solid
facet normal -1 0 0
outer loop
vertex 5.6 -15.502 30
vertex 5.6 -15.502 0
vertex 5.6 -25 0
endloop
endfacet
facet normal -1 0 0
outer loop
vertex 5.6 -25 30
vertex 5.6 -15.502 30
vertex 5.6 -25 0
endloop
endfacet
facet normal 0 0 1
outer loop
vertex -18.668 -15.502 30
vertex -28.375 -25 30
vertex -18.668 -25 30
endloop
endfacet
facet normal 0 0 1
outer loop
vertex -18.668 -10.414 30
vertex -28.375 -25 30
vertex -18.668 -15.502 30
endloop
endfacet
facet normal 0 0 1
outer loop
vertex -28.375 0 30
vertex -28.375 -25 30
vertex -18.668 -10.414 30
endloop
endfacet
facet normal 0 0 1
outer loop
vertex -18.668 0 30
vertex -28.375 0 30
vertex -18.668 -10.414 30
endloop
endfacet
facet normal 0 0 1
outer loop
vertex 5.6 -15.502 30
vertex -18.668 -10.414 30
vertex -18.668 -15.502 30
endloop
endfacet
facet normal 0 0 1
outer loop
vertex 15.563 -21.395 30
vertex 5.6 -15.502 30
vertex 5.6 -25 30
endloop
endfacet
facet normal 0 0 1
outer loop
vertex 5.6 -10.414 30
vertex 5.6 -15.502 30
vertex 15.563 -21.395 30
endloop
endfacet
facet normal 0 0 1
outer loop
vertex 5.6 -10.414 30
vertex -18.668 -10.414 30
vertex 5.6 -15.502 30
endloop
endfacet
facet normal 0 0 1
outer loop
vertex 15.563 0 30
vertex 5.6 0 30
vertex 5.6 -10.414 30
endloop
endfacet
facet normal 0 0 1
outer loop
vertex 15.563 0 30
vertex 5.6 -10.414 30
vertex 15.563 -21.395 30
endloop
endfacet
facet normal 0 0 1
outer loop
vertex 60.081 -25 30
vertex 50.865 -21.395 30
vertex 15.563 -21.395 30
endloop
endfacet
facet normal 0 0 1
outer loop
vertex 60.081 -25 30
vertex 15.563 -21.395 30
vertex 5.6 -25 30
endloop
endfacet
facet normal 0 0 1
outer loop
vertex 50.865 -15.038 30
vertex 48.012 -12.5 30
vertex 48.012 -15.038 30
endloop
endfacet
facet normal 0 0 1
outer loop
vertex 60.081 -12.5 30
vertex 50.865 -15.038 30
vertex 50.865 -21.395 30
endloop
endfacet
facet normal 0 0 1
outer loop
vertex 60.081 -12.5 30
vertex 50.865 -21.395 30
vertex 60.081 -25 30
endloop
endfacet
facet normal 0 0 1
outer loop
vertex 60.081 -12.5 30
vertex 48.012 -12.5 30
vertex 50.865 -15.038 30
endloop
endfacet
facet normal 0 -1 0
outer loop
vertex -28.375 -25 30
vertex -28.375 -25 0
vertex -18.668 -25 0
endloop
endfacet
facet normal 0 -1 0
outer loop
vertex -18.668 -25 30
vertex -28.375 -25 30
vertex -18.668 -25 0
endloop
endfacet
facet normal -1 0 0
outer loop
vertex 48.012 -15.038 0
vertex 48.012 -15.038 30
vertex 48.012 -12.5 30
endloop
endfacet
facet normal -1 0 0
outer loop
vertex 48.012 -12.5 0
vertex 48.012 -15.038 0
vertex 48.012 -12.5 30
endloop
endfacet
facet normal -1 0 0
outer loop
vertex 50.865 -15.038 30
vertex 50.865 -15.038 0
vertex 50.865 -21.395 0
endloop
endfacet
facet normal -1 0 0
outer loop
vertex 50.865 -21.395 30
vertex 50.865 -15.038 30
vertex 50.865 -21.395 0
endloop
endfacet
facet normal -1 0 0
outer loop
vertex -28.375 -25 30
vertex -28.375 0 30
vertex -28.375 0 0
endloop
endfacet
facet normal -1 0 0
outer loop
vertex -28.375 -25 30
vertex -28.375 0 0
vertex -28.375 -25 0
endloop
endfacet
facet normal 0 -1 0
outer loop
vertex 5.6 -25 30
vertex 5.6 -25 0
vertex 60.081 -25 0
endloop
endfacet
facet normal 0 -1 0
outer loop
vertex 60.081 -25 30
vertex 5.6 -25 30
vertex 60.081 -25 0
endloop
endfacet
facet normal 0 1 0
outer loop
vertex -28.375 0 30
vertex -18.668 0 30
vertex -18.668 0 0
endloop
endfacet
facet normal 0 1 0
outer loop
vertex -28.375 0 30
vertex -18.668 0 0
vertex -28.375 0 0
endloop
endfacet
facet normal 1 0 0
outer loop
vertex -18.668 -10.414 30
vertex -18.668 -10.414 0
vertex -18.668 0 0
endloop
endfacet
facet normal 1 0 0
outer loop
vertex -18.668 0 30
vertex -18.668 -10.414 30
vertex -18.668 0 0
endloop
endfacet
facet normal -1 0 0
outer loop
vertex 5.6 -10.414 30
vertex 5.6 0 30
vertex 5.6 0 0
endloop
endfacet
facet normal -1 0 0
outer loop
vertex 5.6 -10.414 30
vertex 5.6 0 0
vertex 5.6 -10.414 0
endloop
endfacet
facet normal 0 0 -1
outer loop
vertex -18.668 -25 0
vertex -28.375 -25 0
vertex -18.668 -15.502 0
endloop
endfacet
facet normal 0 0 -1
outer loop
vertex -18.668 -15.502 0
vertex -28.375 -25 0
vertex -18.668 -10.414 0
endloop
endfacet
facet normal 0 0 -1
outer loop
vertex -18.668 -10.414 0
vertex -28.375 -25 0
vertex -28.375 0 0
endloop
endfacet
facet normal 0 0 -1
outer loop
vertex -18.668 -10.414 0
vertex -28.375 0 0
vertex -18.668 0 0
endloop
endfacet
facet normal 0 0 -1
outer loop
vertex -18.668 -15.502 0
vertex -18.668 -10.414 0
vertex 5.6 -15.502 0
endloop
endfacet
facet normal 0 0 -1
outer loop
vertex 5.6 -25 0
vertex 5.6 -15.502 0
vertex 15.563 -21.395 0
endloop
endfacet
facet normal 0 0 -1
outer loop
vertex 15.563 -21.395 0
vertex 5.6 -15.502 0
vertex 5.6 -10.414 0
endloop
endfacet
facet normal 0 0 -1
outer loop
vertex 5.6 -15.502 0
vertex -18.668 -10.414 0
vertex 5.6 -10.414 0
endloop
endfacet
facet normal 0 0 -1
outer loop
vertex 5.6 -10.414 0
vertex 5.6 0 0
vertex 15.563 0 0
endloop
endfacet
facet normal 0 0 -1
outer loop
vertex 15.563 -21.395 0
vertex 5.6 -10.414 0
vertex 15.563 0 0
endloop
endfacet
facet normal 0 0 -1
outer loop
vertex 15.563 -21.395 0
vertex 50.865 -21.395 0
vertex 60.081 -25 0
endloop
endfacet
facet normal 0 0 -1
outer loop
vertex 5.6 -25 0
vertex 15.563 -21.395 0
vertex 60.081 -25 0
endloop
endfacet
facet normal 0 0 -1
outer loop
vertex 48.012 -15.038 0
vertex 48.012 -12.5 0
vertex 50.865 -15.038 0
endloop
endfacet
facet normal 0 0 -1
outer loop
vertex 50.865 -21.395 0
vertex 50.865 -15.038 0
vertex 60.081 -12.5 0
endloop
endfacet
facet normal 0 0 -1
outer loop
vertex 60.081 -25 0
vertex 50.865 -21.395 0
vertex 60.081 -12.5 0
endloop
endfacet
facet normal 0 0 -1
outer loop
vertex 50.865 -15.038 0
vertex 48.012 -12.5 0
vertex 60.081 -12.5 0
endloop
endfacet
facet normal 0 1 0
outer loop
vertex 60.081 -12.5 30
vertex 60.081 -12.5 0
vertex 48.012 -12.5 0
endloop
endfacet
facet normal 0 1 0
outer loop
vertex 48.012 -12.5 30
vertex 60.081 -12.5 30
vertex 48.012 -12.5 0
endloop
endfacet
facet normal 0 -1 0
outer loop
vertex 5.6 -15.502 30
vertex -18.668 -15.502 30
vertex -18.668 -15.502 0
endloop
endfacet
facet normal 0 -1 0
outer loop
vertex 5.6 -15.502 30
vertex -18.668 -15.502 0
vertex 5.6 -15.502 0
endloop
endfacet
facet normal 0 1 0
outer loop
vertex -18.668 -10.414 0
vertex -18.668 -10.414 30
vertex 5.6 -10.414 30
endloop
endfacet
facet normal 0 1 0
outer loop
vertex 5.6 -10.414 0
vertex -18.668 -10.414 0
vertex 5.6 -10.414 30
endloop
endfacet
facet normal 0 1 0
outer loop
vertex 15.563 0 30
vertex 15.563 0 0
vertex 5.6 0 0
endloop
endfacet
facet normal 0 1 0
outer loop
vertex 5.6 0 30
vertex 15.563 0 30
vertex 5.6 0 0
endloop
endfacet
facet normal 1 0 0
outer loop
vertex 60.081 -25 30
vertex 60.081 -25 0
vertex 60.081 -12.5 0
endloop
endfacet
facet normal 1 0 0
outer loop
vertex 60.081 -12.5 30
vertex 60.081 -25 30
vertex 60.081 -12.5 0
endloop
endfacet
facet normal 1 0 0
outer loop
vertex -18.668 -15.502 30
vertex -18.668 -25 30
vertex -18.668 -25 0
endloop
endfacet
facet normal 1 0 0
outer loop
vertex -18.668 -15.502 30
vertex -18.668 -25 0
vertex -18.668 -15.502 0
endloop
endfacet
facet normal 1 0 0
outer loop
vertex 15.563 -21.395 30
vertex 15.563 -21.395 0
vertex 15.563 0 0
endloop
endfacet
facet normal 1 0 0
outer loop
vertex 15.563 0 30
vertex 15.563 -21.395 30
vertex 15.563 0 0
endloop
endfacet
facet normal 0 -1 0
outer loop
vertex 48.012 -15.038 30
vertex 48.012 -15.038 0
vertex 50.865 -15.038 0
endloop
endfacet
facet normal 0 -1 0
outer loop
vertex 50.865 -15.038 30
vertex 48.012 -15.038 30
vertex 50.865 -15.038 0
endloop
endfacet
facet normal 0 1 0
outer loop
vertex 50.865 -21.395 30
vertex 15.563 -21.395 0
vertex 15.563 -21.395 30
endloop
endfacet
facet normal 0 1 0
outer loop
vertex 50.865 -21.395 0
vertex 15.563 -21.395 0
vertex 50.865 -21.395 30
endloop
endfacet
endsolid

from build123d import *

# Parameters (mm, degrees)
F0_W     = 24.2680183989
F0_H     = 5.0877342001
F0_W_2   = 35.3016227051
F0_H_2   = 3.6045075208
F0_W_3   = 2.852525562
F0_H_3   = 2.53832
F1_DEPTH = 30


with BuildPart() as f1:
    # F0 (on Top) → F1 (new body)
    with BuildSketch(Plane.XY):
        Polygon((-18.6677063226, -10.4143796489), (-18.6677063226, 0), (-28.3749136821, 0), (-28.3749136821, -25), (-18.6677063226, -25), (-18.6677063226, -15.5021138489), align=None)
        with Locations((-6.5336971231, -12.9582467489)):
            Rectangle(F0_W, F0_H)
        Polygon((5.6003120763, 0), (5.6003120763, -10.4143796489), (5.6003120763, -15.5021138489), (5.6003120763, -25), (15.563129677, -25), (15.563129677, -21.3954924792), (15.563129677, 0), align=None)
        with Locations((33.2139410295, -23.1977462396)):
            Rectangle(F0_W_2, F0_H_2)
        Polygon((50.864752382, -21.3954924792), (50.864752382, -25), (60.0811056793, -25), (60.0811056793, -12.5), (50.864752382, -12.5), (50.864752382, -15.03832), align=None)
        with Locations((49.438489601, -13.76916)):
            Rectangle(F0_W_3, F0_H_3)
    extrude(amount=F1_DEPTH)


solid = f1.part
